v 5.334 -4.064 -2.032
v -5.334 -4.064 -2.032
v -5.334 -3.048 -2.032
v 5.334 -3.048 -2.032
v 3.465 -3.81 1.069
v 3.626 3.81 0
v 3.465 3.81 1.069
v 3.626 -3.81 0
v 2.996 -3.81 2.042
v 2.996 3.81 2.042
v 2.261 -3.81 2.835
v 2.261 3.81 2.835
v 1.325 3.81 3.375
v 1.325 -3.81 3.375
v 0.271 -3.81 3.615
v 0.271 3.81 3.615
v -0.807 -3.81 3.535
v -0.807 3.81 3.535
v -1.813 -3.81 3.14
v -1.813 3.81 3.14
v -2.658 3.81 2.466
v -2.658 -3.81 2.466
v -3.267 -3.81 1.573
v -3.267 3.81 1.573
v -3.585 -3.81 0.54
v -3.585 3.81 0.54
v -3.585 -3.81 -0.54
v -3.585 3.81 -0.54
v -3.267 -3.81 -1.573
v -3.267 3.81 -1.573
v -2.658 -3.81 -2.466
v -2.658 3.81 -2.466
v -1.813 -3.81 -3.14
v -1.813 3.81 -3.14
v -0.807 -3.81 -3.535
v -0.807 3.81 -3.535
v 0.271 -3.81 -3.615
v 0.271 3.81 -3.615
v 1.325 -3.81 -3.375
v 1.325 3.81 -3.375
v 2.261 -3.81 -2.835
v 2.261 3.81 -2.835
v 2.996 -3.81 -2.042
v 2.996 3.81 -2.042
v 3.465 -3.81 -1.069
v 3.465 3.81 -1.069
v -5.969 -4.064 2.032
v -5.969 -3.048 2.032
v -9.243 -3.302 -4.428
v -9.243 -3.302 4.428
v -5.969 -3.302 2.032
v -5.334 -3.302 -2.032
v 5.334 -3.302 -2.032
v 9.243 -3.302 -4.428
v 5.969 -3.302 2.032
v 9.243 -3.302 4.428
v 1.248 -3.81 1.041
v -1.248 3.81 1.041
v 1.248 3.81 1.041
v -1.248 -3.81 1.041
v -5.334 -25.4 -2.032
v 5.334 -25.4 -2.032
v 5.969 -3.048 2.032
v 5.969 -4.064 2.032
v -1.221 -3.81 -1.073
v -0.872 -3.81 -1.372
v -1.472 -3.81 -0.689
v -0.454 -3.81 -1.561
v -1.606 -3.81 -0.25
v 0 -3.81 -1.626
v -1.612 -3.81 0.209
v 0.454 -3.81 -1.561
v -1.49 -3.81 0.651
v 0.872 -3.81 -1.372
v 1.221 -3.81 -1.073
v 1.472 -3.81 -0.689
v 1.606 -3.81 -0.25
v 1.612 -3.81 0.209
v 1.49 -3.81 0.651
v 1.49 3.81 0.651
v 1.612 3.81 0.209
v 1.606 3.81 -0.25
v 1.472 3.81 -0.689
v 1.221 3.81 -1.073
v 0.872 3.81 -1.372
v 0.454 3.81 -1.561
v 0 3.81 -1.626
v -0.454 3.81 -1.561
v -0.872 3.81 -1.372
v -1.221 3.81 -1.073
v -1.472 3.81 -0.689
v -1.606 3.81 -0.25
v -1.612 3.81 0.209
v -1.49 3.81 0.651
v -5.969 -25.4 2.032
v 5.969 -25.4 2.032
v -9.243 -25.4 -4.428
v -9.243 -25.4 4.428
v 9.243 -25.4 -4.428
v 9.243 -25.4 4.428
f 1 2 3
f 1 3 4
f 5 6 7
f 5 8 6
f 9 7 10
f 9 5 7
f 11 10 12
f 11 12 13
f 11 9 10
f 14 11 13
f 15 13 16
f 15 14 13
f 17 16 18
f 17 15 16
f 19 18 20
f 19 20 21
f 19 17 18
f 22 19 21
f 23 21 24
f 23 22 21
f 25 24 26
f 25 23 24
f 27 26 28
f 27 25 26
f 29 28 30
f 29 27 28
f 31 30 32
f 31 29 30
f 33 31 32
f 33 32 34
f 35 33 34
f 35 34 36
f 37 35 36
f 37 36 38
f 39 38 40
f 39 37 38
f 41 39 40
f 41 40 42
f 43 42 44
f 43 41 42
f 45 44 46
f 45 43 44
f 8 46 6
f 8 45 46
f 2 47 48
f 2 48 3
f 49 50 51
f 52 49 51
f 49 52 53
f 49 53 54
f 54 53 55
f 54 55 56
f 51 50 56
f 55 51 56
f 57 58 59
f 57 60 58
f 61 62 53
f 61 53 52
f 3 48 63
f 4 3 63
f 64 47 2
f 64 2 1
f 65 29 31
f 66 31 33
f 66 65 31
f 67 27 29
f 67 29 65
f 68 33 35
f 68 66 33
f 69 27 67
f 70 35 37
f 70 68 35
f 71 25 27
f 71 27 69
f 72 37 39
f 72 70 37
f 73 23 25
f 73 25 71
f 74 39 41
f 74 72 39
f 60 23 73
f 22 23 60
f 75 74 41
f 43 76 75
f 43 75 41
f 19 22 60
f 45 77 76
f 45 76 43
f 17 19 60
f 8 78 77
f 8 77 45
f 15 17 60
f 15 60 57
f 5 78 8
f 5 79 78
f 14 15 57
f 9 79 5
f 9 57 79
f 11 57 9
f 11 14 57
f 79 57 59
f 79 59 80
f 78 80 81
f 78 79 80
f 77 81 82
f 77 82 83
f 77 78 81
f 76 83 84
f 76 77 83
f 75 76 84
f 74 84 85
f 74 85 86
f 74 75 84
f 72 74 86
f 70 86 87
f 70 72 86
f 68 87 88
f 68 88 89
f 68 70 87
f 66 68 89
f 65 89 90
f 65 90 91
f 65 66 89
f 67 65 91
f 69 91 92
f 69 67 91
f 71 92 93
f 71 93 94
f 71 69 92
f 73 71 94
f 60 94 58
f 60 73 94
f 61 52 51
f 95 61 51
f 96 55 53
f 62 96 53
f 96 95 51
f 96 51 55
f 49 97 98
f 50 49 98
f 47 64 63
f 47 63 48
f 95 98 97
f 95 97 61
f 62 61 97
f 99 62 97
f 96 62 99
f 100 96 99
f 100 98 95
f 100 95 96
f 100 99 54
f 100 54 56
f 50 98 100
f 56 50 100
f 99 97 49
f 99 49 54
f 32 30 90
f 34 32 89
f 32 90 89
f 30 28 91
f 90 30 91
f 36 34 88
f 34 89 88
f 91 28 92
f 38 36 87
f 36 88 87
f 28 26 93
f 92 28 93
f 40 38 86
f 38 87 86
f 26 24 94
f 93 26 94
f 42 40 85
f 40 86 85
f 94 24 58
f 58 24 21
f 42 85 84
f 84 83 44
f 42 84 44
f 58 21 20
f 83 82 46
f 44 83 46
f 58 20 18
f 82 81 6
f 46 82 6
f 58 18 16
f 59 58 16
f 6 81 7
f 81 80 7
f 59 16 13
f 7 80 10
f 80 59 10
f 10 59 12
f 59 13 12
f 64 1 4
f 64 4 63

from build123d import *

# Parameters (mm, degrees)
F0_R     = 3.6256
F3_DEPTH = 3.81
F2_W     = 18.4858385473
F2_H     = 8.8563207537
F4_DEPTH = 22.098
F5_DEPTH = 22.352
F6_DEPTH = 21.336


with BuildPart() as f3:
    # F0 (on Front) → F3 (new body, symmetric)
    with BuildSketch(Plane.XZ):
        Circle(F0_R)
        with BuildLine():
            ThreePointArc((1.2482232973, 1.0414), (0, -1.6256), (-1.2482232973, 1.0414))
            Line((-1.2482232973, 1.0414), (0.1749682033, 1.0414))
            Line((0.1749682033, 1.0414), (1.2482232973, 1.0414))
        make_face(mode=Mode.SUBTRACT)
    extrude(amount=F3_DEPTH, both=True)


with BuildPart() as f4:
    # F2 (on offset) → F4 (new body)
    with BuildSketch(Plane.XZ.offset(25.4)):
        Rectangle(F2_W, F2_H)
        Polygon((-5.969, 2.032), (0, 2.032), (5.969, 2.032), (5.334, -2.032), (0, -2.032), (-5.334, -2.032), align=None, mode=Mode.SUBTRACT)
    extrude(amount=-F4_DEPTH)


with BuildPart() as f5:
    # F2 (on offset) → F5 (new body)
    with BuildSketch(Plane.XZ.offset(25.4)):
        Polygon((5.969, 2.032), (0, 2.032), (-5.969, 2.032), (-5.334, -2.032), (0, -2.032), (5.334, -2.032), align=None)
    extrude(amount=-F5_DEPTH)

    # F6 (cut): a face of the model
    f6_faces = [f5.faces().sort_by_distance(p)[0] for p in [
        (0, -25.4, 0.0380524345),
    ]]
    extrude(f6_faces, amount=-F6_DEPTH, mode=Mode.SUBTRACT)


solid = Compound([f3.part, f4.part, f5.part])
